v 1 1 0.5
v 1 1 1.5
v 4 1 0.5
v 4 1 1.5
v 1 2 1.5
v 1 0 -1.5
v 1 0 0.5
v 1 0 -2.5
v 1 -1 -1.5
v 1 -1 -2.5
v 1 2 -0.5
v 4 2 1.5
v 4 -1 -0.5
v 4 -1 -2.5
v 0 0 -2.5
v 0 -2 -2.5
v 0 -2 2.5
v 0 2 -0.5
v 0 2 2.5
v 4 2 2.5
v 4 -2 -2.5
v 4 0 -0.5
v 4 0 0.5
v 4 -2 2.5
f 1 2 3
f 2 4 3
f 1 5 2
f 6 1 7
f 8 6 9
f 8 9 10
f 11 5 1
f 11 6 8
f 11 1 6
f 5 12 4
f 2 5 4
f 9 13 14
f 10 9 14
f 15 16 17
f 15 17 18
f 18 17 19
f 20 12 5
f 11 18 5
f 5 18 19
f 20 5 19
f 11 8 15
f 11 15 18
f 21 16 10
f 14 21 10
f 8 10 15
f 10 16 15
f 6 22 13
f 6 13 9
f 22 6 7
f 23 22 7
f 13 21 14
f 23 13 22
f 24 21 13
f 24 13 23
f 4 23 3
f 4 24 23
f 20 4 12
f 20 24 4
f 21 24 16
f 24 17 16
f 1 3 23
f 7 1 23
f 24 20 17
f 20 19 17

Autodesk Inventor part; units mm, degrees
ref_plane "YZ Plane" through (0, 0, 0) normal (1, 0, 0) x (0, 1, 0)
ref_plane "XZ Plane" through (0, 0, 0) normal (0, 1, 0) x (-1, 0, 0)
ref_plane "XY Plane" through (0, 0, 0) normal (0, 0, 1) x (1, 0, 0)
sketch "草圖1" plane through (0, 0, 0) normal (1, 0, 0) x (0, 1, 0)
  line L0 (0, -3.5) -> (0, 3.5) projected
  line L1 (-2.8, 0) -> (2.8, 0) projected
  line L2 (-2, -2.5) -> (2, -2.5)
  line L3 (2, -2.5) -> (2, 2.5)
  line L4 (2, 2.5) -> (-2, 2.5)
  line L5 (-2, 2.5) -> (-2, -2.5)
  line L6 (-2, -2.5) -> (2, 2.5) construction
  line L7 (2, -2.5) -> (-2, 2.5) construction
  point P0 (0, 0)
  dimension "d0" = 4
  dimension "d1" = 5
extrude "擠出1" add sketch "草圖1" along normal blind 4
sketch "草圖2" plane through (4, 0, 0) normal (1, 0, 0) x (0, 0, -1)
  line L0 (0, -2.8) -> (0, 2.8) projected
  line L1 (3.5, 0) -> (-3.5, 0) projected
  line L2 (2.5, -2) -> (2.5, 2) projected
  line L3 (2.5, 2) -> (0.5, 2)
  line L4 (2.5, 2) -> (2.5, 0)
  line L5 (2.5, 0) -> (0.5, 2)
  line L6 (2.5, 2) -> (-2.5, 2) projected
  line L7 (-2.5, 2) -> (-1.5, 2)
  line L8 (-1.5, 2) -> (-1.5, 1)
  line L9 (-1.5, 1) -> (-0.5, 1)
  line L10 (-0.5, 1) -> (-0.5, 0)
  line L11 (-0.5, 0) -> (1.5, 0)
  line L12 (1.5, 0) -> (1.5, -1)
  line L13 (1.5, -1) -> (2.5, -1)
  line L14 (2.5, -1) -> (2.5, -2)
  line L15 (-2.5, 2) -> (-2.5, -2) projected
  line L16 (2.5, -2) -> (-2.5, -2)
  line L17 (-2.5, -2) -> (-2.5, 2)
  point P0 (0, 0)
  dimension "d4" = 2
  dimension "d5" = 2
  dimension "d6" = 1
  dimension "d7" = 1
  dimension "d8" = 1
  dimension "d9" = 1
  dimension "d10" = 2
  dimension "d11" = 1
extrude "擠出2" cut sketch "草圖2" against normal blind 1000 contours L3 L2 L5
extrude "擠出3" cut sketch "草圖2" against normal blind 3 contours L1 L10 L9 L8 L6 L0 | L0 L6 L5 L1 | L1 L2 L13 L12
sketch "草圖3" plane through (4, 0, 0.5) normal (0, 1, 0) x (1, 0, 0)
  line L0 (0, 2) -> (0, 0) projected
  line L1 (0, 2) -> (-3, 2) projected
  line L2 (-3, 2) -> (-3, 0) projected
  line L3 (0, 0) -> (-3, 0) projected
  line L4 (0, 2) -> (0, 1)
  line L5 (0, -2) -> (0, 3) projected
  line L6 (0, 1) -> (-3, 2)
  point P0 (-4, 0.5)
  dimension "d16" = 1
extrude "擠出4" cut sketch "草圖3" against normal blind 1 contours L0 L6 L1
properties part number "15"
